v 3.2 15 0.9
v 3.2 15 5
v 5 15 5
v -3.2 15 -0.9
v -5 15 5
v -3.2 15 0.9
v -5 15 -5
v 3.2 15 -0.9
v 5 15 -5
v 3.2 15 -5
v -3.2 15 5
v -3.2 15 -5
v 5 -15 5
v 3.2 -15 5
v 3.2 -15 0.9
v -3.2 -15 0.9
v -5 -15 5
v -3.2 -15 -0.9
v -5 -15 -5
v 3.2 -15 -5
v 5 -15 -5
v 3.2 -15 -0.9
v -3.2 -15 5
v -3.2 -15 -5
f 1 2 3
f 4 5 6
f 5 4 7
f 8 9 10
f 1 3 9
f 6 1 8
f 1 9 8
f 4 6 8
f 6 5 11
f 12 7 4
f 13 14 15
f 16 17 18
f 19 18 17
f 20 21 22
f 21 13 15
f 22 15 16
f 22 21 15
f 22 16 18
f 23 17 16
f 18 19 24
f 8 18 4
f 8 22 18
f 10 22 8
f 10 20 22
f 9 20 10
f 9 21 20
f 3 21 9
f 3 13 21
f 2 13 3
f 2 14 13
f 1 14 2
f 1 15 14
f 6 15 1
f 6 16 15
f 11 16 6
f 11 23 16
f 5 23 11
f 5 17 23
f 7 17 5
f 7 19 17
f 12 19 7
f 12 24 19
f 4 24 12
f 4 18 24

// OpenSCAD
// file: beamlib.scad
/*
 * beamlib.scad
 *
 * Copyright (C) Kent Forschmiedt 2020, All Rights Reserved
 */
 
 _DefaultRelief = .015;
 _JointInsertDepth = 15;
 
/*
 * grommet - Put a screw grommet in something.
 *
 * h - height
 * r - radius
 * thickness - grommet wall
 * offset - location
 *
 * This will punch a hole through any number of objects
 */
module grommet(h, r, thickness, offset=[0,0,0])
{
    if ($children == 0) {
        translate(offset)
        difference() {
            cylinder(h=h, r=r+thickness, center=true);
            cylinder(h=h+1, r=r, center=true);
        }
    } else if (r == 0) {
        children();
    } else {
        difference() {
            union() {
                translate(offset)
                    cylinder(h=h, r=r+thickness, center=true);
                children();
            }
            translate(offset)
                cylinder(h=h+1, r=r, center=true);
        }
    }
}

/*
 * iBeam - simple I-beam
 *
 * size - width, height, length
 * thickness - rail thickness
 * rot - degrees: optionally rotate beam around length axis
 *
 * Z and Y are swapped, so length is in the Y axis
 *
 * For larger beams, it would be nice to round the
 * ends of the rails.
 */
function iBeamPoints(size, thickness) = [ for (e = [
            [0,0], [0,size[1]], [thickness,size[1]],
            [thickness, (size[1]+thickness)/2],
            [size[0]-thickness,(size[1]+thickness)/2],
            [size[0]-thickness, size[1]],[size[0], size[1]],
            [size[0],0], [size[0]-thickness,0],
            [size[0]-thickness, (size[1]-thickness)/2],
            [thickness, (size[1]-thickness)/2],
            [thickness,0],[0,0] ]) e - [size[0]/2, size[1]/2] ];

module iBeam(size, thickness, rot=0)
{
    width = size[0];
    height = size[1];
    length = size[2];
    rotate([90,rot,0])
    translate([0,0,-length/2])
    linear_extrude(height=length)
        polygon(iBeamPoints(size, thickness));
}

/*
 * uBeam - Curved I-beam
 *
 * size - width, height, length
 * thickness - rail thickness
 * angle - degrees of arc to extrude
 * rot - degrees: optionally rotate beam around length axis
 *
 * Z and Y are swapped, so length is in the Y axis
 *
 * For larger beams, it would be nice to round the
 * ends of the rails.
 */
module uBeam(size, thickness, angle=180, rot=0)
{
    rotate_extrude(angle=angle)
        translate([size[2], 0, 0])
        rotate([0,0,rot])
        polygon(iBeamPoints(size, thickness));
}

/*
 * sqBeam - a hollow box beam
 *
 * size - w, h, l
 * thickness - wall of box
 * plug - bool, leaves 1/3 solid
 *
 * Z and Y are swapped, so length is in the Y axis
 *
 * A rounded corner version would be good
 */
module sqBeam(size, thickness, plug=false, relief=_DefaultRelief)
{
    width = size[0];
    height = size[1];
    length = size[2];
    
    translate([0, length/2, 0])
    difference() {
        cube([width+2*thickness, length, height+2*thickness], center=true);    
        translate([0,plug? length-_JointInsertDepth : 0, 0])
        cube([width+2*relief, length+1, height+2*relief], center=true);
    }
}

/*
 * _beamJunc
 */
module _beamJunc(size, angles, thickness, lengths=[])
{
    width = size[0];
    height = size[1];
    length = size[2];

    union() {
        sqBeam([width, height, length], thickness, plug=true);
        for (a = angles) {
            rotate([0, 0, a])
            translate([0,-.001, 0])
                sqBeam([width, height, length], thickness, plug=true);
        }
    }
}

module _juncPlate(size, angles, thickness)
{
    width = size[0];
    height = size[1];
    length = size[2];
    wsize = width+thickness;
    
    hull() {
        translate([-wsize/2, 0, 0])
          cube([wsize, length, thickness], center=false);
        for (a = angles) {
            rotate([0, 0, a])
            translate([-wsize/2, 0, 0])
                cube([wsize, length, thickness], center=false);
        }
    }
}

/*
 * beamJunction - Join n ends together
 */
module beamJunction(size, angles, thickness, lengths=[], axleRadius=-1, relief=_DefaultRelief, axleYoffset=0)
{
    width = size[0];
    height = size[1];
    length = size[2];

    plateThickness = 2*thickness;
    
    zoff = height / 2
         + relief           // Surface of centered beam
         + 2* thickness     // plate is 2 * thickness, uncentered
         + relief;          // put top of plate below bottom of beam

    // axle bushing
    l1 = length * cos(angles[0]);
    bushingThickness = 2*thickness;
    gheight = height + 3*thickness;
    axleZoff = -thickness + 4*relief;    //
    axleYoff = (abs(l1) + height/2 + axleYoffset);

    if (axleRadius > 0) {
        grommet(h=gheight, r=axleRadius, thickness=bushingThickness,
                offset=[0, axleYoff, axleZoff])
        {
            rotate([0, 0, -angles[0]/2])
            union() {
                _beamJunc(size, angles, thickness, lengths=lengths);
                translate([0, 0, -zoff])
                    // Does not include extended legs!
                    _juncPlate(size, angles, plateThickness);
            }
        }
    } else {
        rotate([0,0,-angles[0]/2])
        union() {
            _beamJunc(size, angles, thickness, lengths=lengths);
            translate([0,0, -zoff])
                _juncPlate(size, angles, plateThickness);
        }
    }
}


module beamEye(size, thickness, rgrommet, relief=_DefaultRelief)
{
    width = size[0];
    height = size[1];
    length = size[2];
    gthick = width + 2* thickness;

    grommet(h=gthick, r=rgrommet, thickness=gthick/2-rgrommet,
                offset=[0, 0, 0]) 
    sqBeam([width, height, length], thickness, plug=true);
}
// main file
/*
 * I-Beams
 *
 * Copyright (C) 2020 Kent Forschmiedt, All Rights Reserved
 */

use <beamlib.scad>

/* [Beam] */
BeamWidth = 10;
BeamHeight = 10;
BeamThickness = 1.8;
Length = 30;
Length2 = 60;
BeamRadius = 44;
BeamArc = 180;
BeamRotate = 0;

/* [Bracket] */
HeadAngle = 60;
JointInsertDepth = 20;
BracketMargin = 20;
BracketThickness = 1.2;
ScrewSize = 3.5;        // #6 == 3.5, #8 == 4.2
Relief = 0.15;
AxleYAdj = -18;

/* [Axle] */
AxleRadius = 3;
AxleSize = 150;         // try 80

/* [Pad] */
PadThickness = 1.5;

/* [Selection] */
DrawBeam = true;
DrawUBeam = false;
DrawHead = false;
DrawLJoint = false;
DrawRJoint = false;
DrawJunc = false;
DrawLAnchor = false;
DrawRAnchor = false;
DrawAxle = false;
DrawAxleEnds = false;
DrawEyes = false;
DrawWasher = false;
DrawBushing=false;
DrawArch = false;
DrawPad = false;
DrawPadBase = false;

/* [Options] */

$fa = 1.1;
$fs = 1.2;

/*
 * beamAnchor - anchor bracket plate for beams
 *
 * size - [w, h, l]
 * angle - rotation of bracket
 * thickness - bracket wall thickness
 * relief - socket oversize
 * margin - bracket extension beyond boundary of socket
 * dscrew - diameter of screw #6 == 3.5, #8 == 4.2
 *
 * interior size is increased by Relief
 */
module beamAnchor(size, angle, thickness, relief=.15, margin=20, dscrew=3.5)
{
    width = size[0];
    height = size[1];
    length = size[2];
    
    rotate([0, 0, -angle])
        sqBeam([width, height, length], thickness, plug=true);

    w1 = length * sin(angle);
    l1 = length * cos(angle);
    translate([w1/2, l1/2, -height/2-thickness - 2*relief])
        grommet(h=2*thickness, r=dscrew/2, thickness=thickness,
                offset=[-(abs(w1)/2 + 2*margin/3), 0, 0]) 
        grommet(h=2*thickness, r=dscrew/2, thickness=thickness,
                offset=[(abs(w1)/2 + 2*margin/3), 0, 0]) 
        cube([abs(w1) + 2.5*margin, abs(l1) + margin/2, 2*thickness],
             center=true);
}


module axle(h, r)
{
    rotate([90, 0, 0])
    cylinder(h=h, r=r, center=true);
}

module axleEnds(r, relief=0.15)
{
    for (yoff = [0, 6*r])
        translate([6*r, yoff, 0])
        difference() {
            cylinder(h=6, r=2*r, center=true);
            translate([0,0,1.5])
            cylinder(h=4, r=r+2*relief, center=true);
        }
}

module Pad(r, thickness, rim=true, screwsize=0, texture=false) {
    couplerHeight = 15;

    texangle = 80;
    texheight = 2.2;
    texbase = 2 * texheight * tan(texangle/2);
    texoff = 0;
    sqr3 = sqrt(3);
    
    // triangle for texture
    texpoints = [ [-texbase/2, -texheight/2],
                  [texbase/2, -texheight/2],
                  [0, texheight/2] ];
    crosshatch = [-35, 35];
    
    // grommet is no-op when screwsize == 0
    grommet(h=thickness, r=screwsize/2, thickness=thickness,
                offset=[.5*r, .5*r, thickness/2]) 
    grommet(h=thickness, r=screwsize/2, thickness=thickness,
                offset=[-.5*r, -.5*r, thickness/2]) 
    difference() {
        linear_extrude(height=2*thickness)
            circle(r);
        
        // Subtract half of disk, with or without rim
        translate([0,0,thickness])
        linear_extrude(height=thickness+1)
            circle(r-(rim?thickness:-.001));

        //subtract texture
        if (texture)
            for (x = [-r-8: 2*texbase: r+8], a = crosshatch)
                translate([x, 0, texoff])
                rotate([90,0,a])
                translate([0,0,-1.25*r])
                linear_extrude(2.5*r)
                    polygon(texpoints);
    }

    // put rim on face
    difference() {
        linear_extrude(height=thickness)
            circle(r);
        translate([0,0,-.5])
        linear_extrude(height=thickness+1)
            circle(r-thickness);
    }
    
    // socket
    translate([0,0,thickness - .001])
        rotate([90,0,0])
        sqBeam([BeamWidth, BeamHeight, couplerHeight + .001],
                thickness, plug=false);

    // radial braces
    basex = BeamWidth/2 + thickness;
    points = [ [basex, thickness],
               [r-thickness+.001, thickness],
               [r-thickness+.001, 2*thickness],
               [basex, thickness + couplerHeight],
               [basex, thickness] ];

    for (a = [0: 90: 360]) {
        rotate([90,0,a])
        translate([0,0,-thickness/2])
        linear_extrude(thickness)
            polygon(points);
    }
}

if (DrawPad) {
        Pad(BeamRadius, PadThickness, texture = true);
}

if (DrawPadBase)
        Pad(BeamRadius, PadThickness, screwsize=3.5, rim=false);

if (DrawEyes)
    beamEye([BeamWidth, BeamHeight, AxleRadius, 30], BeamThickness);

if (DrawBeam) {
    iBeam([BeamWidth, BeamHeight, Length], BeamThickness, rot=0);
}

if (DrawUBeam) {
    uBeam([BeamWidth, BeamHeight, BeamRadius], BeamThickness, angle=BeamArc, rot=BeamRotate);
}

if (DrawHead) {
    translate([Length, -Length-10, 0])
    beamJunction([BeamWidth, BeamHeight, Length], angles=[HeadAngle],
                 thickness=BracketThickness, axleRadius=AxleRadius,
                 axleYoffset=AxleYAdj);
}

if (DrawLJoint) {
    translate([Length+10, Length, 0])
    beamJunction([BeamWidth, BeamHeight, Length], angles=[-HeadAngle,180],
                 thickness=BracketThickness);
}

if (DrawRJoint) {
    translate([Length, 3*Length+10, 0])
    beamJunction([BeamWidth, BeamHeight, Length], angles=[HeadAngle,180],
                 thickness=BracketThickness);
}

if (DrawJunc) {
    beamJunction([BeamWidth, BeamHeight, Length], angles=[60, 210],
                 thickness=BracketThickness, axleRadius=AxleRadius);
}

if (DrawLAnchor) {
    translate([-Length-30, Length, 0])
    beamAnchor([BeamWidth, BeamHeight, Length], HeadAngle/2, BracketThickness,
                Relief, BracketMargin, ScrewSize);
}

if (DrawRAnchor) {
    translate([-Length-15, -Length-10, 0])
    beamAnchor([BeamWidth, BeamHeight, Length], -HeadAngle/2, BracketThickness,
                Relief, BracketMargin, ScrewSize);
}

if (DrawAxle) {
    translate([-20, 0, 0])
    axle(AxleSize, AxleRadius - 4 * Relief);
}

if (DrawAxleEnds) {
    axleEnds(AxleRadius - 4 * Relief, relief=Relief);
}

if (DrawWasher) {
    grommet(h=2*BracketThickness, r=AxleRadius, thickness=5*BracketThickness);
}

if (DrawBushing) {
    grommet(h=50, r=AxleRadius, thickness=3*BracketThickness);
}
